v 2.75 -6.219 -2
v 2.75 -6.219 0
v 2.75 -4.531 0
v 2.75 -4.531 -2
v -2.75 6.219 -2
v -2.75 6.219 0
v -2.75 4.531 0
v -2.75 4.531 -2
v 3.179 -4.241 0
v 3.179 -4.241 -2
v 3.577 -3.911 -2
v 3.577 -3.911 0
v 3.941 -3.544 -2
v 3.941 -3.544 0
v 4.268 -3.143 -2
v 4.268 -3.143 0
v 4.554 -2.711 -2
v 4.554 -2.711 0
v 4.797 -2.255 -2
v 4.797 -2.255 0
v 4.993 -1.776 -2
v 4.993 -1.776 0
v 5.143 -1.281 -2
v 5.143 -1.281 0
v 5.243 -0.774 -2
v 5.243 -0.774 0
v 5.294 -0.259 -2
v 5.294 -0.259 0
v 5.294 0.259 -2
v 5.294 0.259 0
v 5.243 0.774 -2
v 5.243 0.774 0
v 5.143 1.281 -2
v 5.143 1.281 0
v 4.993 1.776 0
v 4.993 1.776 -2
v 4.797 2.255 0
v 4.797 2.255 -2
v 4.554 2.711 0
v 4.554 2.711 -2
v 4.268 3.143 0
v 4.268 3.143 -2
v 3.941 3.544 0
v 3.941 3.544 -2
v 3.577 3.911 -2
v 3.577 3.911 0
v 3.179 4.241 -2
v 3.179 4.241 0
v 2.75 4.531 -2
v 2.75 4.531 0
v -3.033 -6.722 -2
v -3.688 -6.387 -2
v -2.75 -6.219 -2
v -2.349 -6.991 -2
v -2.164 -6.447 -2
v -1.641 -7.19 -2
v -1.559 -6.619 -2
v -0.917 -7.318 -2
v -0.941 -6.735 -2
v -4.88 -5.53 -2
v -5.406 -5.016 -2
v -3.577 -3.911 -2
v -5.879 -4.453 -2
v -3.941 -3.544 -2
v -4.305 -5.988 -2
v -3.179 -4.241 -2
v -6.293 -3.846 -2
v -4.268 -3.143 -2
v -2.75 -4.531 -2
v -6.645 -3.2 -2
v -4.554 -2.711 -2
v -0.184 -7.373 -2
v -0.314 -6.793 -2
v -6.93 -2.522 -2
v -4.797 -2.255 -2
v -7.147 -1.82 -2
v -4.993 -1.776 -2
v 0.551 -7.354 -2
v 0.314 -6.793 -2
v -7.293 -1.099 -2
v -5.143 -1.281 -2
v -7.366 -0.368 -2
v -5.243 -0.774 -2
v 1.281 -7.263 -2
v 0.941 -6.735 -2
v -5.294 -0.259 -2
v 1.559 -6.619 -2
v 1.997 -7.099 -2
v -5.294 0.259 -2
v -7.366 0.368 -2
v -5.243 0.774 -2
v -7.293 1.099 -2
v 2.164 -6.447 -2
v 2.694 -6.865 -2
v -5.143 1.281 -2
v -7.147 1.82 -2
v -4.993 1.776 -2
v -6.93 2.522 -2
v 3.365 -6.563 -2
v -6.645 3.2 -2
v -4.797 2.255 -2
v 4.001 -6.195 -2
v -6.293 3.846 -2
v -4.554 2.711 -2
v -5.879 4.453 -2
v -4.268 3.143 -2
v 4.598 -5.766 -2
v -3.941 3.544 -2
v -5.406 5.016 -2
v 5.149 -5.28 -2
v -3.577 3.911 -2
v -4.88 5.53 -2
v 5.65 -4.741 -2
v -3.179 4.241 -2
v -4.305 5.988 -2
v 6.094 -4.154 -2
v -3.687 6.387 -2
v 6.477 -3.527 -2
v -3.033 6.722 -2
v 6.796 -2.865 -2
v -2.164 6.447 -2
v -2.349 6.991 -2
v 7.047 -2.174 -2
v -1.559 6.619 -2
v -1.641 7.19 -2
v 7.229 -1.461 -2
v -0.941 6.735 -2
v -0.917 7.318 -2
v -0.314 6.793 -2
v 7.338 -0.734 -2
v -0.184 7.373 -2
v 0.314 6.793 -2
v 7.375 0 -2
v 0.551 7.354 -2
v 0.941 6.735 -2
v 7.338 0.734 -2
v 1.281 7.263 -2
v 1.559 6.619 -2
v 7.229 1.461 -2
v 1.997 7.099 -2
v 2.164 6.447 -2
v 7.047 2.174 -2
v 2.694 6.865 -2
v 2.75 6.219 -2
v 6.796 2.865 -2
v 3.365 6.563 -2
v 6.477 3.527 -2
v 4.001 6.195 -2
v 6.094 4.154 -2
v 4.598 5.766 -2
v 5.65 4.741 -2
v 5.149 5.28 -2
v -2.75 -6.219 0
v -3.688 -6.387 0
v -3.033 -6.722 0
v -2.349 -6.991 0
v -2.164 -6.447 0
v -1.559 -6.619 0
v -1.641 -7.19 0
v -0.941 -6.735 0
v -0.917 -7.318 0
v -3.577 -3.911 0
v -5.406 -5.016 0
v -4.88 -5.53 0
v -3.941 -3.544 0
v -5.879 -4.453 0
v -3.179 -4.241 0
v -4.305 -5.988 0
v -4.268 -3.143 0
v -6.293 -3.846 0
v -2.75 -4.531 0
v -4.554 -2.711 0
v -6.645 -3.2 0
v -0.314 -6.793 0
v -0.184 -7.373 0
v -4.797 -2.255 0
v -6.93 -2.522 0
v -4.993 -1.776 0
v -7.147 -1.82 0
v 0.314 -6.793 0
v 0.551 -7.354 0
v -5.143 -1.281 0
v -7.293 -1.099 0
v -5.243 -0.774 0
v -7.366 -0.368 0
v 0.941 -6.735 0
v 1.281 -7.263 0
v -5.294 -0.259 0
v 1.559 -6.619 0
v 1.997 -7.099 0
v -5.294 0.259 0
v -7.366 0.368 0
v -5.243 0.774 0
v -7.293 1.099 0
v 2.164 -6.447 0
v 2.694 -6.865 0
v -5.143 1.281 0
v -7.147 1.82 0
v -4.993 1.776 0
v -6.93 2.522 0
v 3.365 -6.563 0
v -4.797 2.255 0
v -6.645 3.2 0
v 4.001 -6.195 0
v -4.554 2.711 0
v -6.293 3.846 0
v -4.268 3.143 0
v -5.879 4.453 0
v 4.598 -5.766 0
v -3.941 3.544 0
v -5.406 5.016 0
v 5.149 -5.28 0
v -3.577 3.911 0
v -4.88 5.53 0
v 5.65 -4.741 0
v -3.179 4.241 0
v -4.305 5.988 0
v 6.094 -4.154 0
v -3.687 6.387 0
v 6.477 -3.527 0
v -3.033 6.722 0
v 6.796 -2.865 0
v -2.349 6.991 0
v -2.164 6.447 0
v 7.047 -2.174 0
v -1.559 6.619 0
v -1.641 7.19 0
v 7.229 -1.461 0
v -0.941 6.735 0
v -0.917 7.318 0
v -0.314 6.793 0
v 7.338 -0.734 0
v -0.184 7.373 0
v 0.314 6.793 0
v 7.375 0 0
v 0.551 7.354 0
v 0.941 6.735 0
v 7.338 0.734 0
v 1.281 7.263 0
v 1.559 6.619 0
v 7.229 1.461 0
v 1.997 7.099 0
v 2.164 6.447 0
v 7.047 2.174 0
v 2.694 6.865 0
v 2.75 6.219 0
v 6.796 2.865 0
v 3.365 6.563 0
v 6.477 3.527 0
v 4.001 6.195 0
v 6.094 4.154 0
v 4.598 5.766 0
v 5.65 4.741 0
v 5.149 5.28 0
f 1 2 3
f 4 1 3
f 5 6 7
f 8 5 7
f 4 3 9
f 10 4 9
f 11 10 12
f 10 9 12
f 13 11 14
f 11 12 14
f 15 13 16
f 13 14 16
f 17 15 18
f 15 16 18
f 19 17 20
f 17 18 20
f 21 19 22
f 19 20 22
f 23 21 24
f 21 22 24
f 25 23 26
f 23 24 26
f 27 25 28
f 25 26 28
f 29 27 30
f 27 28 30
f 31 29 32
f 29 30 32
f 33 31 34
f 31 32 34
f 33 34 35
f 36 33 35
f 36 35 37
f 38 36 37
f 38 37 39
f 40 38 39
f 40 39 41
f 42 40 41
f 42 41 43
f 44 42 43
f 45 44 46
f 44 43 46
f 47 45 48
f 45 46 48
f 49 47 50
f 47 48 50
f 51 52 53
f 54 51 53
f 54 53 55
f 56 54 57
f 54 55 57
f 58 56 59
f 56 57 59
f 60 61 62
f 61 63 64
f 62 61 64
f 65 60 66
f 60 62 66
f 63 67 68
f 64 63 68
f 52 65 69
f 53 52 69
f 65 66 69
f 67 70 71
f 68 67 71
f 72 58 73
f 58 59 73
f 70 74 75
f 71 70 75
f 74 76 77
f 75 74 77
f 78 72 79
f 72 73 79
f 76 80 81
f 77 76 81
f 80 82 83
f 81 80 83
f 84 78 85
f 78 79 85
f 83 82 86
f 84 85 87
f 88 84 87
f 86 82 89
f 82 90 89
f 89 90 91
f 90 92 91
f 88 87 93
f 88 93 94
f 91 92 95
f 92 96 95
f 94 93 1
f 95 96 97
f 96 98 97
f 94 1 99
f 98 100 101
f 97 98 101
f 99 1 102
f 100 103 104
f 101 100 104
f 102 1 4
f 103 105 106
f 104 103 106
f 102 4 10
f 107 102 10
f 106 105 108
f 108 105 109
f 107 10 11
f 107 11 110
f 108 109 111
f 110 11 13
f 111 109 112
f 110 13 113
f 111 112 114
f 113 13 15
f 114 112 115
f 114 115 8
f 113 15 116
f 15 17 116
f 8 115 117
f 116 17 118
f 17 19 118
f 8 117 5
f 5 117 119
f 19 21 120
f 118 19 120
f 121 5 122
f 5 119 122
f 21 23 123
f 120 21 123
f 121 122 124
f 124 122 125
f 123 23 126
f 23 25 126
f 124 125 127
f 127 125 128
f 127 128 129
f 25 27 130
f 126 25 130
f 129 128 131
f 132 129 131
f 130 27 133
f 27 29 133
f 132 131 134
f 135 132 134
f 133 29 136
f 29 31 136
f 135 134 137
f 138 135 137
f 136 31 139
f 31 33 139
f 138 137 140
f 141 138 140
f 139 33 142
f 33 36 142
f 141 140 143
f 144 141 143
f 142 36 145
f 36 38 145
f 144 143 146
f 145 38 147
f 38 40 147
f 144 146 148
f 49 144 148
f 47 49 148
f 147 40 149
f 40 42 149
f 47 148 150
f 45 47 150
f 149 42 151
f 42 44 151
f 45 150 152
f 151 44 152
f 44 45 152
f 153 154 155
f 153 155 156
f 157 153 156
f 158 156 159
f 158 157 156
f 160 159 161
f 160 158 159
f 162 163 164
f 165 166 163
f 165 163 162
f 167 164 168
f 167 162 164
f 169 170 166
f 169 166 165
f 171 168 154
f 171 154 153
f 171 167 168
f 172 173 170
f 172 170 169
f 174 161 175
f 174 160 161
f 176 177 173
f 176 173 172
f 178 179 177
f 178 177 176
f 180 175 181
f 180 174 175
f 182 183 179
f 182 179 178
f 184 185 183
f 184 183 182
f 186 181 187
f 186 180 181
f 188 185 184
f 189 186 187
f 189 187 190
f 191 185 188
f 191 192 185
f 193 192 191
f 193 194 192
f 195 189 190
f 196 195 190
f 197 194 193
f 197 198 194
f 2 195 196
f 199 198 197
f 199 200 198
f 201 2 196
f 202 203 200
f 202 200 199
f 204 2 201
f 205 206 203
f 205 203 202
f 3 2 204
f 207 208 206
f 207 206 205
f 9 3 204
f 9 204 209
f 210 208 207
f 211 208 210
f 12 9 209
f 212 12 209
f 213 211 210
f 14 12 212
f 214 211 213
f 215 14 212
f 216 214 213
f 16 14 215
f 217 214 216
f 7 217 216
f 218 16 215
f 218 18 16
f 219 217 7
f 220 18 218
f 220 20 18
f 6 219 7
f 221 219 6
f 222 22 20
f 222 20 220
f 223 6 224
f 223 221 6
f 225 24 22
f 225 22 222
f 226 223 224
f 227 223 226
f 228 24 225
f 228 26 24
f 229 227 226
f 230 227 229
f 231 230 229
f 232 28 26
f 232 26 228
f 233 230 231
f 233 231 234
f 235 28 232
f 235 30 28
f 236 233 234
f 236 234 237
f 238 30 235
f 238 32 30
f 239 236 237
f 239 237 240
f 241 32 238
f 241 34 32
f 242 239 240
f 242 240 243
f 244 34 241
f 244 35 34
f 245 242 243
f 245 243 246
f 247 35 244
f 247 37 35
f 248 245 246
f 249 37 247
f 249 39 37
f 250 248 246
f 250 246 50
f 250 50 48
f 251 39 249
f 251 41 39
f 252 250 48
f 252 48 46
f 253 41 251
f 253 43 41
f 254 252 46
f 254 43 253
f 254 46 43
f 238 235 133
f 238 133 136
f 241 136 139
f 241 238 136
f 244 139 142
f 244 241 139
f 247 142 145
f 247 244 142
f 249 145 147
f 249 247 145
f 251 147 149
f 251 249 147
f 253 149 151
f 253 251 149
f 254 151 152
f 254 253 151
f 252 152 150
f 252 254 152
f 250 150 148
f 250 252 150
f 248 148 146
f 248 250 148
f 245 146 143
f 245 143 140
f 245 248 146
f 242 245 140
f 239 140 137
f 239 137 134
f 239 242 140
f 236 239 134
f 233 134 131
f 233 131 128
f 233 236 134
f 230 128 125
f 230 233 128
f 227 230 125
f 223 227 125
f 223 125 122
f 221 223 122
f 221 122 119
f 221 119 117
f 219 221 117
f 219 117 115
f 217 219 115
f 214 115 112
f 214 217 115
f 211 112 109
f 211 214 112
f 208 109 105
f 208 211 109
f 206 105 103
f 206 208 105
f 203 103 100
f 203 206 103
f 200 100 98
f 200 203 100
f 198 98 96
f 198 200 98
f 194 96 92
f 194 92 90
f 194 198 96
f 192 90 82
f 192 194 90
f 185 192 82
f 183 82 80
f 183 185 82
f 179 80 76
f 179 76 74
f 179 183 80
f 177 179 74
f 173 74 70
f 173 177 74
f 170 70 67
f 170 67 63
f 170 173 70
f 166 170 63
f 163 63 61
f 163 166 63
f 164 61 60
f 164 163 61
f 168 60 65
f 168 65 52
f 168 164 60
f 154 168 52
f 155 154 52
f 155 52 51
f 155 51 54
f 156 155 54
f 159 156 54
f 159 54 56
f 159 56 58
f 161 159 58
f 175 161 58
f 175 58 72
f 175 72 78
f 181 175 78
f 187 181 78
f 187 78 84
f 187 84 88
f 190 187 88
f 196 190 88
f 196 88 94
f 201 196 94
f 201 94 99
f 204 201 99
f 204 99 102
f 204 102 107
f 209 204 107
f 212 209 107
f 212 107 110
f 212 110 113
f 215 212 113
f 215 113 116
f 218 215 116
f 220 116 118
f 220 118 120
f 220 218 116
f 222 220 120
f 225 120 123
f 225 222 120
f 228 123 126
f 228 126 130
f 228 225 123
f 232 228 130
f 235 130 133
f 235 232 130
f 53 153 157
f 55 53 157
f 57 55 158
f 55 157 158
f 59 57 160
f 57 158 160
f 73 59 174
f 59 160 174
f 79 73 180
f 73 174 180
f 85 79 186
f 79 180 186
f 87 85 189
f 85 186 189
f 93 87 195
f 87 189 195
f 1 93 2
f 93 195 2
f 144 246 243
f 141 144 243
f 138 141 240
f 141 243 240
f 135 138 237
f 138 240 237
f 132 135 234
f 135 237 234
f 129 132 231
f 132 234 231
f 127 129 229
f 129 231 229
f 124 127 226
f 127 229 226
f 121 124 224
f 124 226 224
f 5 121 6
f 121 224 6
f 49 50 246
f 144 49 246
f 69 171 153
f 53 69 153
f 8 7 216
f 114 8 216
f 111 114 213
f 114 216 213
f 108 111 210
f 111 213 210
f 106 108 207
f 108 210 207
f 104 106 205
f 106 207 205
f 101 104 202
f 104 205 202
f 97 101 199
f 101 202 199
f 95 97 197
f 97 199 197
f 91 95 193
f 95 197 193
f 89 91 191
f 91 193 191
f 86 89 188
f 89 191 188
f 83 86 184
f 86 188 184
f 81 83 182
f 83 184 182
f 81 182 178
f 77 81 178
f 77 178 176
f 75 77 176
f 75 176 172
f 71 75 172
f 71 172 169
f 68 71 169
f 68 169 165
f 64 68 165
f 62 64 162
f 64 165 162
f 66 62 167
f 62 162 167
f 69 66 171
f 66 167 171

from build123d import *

# Parameters (mm, degrees)
SKETCH3_R           = 7.375
BOSS_EXTRUDE1_DEPTH = 2


with BuildPart() as part:
    # Sketch3 → Boss-Extrude1 (new body)
    with BuildSketch(Plane.XY):
        Circle(SKETCH3_R)
        with BuildLine():
            Line((-2.75, 6.219123732), (-2.75, 4.530728418))
            ThreePointArc((-2.75, 4.530728418), (-5.3, 0), (-2.75, -4.530728418))
            Line((-2.75, -4.530728418), (-2.75, -6.219123732))
            ThreePointArc((-2.75, -6.219123732), (0, -6.8), (2.75, -6.219123732))
            Line((2.75, -6.219123732), (2.75, -4.530728418))
            ThreePointArc((2.75, -4.530728418), (5.3, 0), (2.75, 4.530728418))
            Line((2.75, 4.530728418), (2.75, 6.219123732))
            ThreePointArc((2.75, 6.219123732), (0, 6.8), (-2.75, 6.219123732))
        make_face(mode=Mode.SUBTRACT)
    extrude(amount=-BOSS_EXTRUDE1_DEPTH)


solid = part.part
